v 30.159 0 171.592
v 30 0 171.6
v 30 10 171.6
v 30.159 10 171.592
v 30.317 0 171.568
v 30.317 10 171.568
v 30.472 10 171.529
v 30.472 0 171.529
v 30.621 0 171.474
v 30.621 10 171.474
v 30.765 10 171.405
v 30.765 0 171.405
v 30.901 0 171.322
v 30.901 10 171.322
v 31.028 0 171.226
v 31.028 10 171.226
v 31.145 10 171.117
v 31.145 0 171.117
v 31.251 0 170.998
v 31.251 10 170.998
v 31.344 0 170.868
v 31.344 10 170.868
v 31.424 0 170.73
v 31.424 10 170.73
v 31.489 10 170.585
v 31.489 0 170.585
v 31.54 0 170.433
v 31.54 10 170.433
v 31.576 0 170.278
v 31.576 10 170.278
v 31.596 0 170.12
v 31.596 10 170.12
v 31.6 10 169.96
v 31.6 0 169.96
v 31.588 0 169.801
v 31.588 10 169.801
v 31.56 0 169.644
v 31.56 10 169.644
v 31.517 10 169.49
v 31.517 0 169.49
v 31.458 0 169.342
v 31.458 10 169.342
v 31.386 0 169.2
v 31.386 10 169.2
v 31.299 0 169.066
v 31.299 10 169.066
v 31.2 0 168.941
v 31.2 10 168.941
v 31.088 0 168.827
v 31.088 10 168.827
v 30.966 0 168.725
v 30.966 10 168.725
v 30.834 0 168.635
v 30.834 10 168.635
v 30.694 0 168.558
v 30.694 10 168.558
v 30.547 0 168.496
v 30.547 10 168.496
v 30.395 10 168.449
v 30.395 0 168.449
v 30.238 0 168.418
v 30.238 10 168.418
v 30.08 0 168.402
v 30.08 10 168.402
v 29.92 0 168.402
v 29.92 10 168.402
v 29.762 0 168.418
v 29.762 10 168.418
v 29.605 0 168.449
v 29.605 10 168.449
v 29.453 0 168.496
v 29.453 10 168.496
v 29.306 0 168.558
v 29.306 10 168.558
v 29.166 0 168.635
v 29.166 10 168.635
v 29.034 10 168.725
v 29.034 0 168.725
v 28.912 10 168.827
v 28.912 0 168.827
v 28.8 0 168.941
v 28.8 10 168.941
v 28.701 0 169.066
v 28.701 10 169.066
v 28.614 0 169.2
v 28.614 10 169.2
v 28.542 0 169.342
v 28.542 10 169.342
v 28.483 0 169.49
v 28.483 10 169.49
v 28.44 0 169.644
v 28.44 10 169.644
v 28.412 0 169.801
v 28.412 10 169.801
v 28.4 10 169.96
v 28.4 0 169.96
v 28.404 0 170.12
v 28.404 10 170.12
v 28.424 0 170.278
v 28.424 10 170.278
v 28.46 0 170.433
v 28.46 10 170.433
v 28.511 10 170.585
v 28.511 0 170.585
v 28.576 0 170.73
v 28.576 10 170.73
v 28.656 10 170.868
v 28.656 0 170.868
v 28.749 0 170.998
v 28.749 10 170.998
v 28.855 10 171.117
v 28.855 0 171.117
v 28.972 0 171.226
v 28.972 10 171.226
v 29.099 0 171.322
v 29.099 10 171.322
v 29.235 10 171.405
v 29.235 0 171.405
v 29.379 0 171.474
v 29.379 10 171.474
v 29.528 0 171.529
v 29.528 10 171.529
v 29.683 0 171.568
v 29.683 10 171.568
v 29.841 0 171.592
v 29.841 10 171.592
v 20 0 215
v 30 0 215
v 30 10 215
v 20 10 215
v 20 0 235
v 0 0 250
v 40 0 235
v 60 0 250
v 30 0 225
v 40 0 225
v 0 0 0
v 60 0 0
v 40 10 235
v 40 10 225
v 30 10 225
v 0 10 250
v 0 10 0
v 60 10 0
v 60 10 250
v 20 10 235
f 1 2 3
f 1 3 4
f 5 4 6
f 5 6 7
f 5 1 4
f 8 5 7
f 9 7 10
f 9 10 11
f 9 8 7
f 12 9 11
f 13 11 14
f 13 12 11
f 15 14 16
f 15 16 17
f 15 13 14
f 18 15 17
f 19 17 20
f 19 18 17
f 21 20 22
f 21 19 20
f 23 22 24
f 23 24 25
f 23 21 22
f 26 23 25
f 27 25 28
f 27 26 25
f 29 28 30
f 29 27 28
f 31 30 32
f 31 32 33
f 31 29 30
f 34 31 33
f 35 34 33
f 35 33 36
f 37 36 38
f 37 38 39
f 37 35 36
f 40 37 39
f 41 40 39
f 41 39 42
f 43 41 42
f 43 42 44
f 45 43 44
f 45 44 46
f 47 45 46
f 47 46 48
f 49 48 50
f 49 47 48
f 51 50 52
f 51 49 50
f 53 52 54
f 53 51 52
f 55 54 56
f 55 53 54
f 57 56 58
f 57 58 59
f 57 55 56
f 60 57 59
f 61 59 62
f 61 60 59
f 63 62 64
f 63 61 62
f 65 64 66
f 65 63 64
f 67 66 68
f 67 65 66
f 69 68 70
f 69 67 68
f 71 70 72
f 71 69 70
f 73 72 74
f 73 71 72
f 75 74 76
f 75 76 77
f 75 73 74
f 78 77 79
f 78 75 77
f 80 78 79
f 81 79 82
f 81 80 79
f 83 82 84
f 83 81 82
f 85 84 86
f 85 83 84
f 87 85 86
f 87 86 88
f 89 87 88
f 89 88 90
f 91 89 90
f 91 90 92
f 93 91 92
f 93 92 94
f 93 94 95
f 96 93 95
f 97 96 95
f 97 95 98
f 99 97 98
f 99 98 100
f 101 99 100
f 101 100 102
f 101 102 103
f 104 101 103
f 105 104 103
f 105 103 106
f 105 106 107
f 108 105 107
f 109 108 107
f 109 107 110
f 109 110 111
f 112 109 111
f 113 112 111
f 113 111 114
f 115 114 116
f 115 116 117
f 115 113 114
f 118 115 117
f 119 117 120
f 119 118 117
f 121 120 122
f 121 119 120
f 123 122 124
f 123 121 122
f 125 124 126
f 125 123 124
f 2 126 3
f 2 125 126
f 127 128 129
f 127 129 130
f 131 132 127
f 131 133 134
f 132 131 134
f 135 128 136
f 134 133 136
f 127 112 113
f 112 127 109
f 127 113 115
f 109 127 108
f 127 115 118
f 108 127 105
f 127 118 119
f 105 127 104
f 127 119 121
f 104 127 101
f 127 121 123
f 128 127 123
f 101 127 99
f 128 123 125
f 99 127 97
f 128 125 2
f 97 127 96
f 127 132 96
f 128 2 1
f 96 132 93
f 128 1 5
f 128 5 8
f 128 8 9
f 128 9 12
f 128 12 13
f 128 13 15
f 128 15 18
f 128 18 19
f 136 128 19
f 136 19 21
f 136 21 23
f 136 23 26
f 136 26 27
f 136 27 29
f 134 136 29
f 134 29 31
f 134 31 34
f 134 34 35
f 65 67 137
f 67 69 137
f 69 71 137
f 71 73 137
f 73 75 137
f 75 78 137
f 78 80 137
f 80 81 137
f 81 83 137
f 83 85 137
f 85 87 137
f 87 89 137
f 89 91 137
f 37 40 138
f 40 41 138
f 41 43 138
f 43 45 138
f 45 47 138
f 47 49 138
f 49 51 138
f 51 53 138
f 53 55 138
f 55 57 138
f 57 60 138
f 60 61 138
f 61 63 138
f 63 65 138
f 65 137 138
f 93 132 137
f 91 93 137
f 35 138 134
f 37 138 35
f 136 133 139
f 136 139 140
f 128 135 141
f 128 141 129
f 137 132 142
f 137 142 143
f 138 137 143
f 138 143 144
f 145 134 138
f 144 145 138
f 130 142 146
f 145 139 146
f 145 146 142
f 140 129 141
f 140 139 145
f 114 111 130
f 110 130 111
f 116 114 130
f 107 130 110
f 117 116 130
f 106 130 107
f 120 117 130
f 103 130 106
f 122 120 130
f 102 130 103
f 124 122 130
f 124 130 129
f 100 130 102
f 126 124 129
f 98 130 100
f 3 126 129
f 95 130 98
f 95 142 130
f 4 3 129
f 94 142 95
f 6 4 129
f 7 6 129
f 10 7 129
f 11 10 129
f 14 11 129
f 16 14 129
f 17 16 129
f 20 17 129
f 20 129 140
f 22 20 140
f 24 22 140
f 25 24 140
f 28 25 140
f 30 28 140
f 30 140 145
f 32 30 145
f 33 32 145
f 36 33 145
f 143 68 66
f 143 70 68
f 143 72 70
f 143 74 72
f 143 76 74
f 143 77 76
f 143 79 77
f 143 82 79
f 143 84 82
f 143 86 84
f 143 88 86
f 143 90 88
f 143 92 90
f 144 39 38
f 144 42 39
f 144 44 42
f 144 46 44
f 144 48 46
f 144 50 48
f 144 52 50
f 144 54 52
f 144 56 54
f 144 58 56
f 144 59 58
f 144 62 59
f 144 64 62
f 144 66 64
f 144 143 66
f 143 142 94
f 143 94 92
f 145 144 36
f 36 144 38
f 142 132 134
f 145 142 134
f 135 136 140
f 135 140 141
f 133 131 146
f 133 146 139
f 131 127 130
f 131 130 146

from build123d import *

# Parameters (mm, degrees)
SKETCH1_W           = 60
SKETCH1_H           = 250
SKETCH1_R           = 1.6
BOSS_EXTRUDE1_DEPTH = 10


with BuildPart() as part:
    # Sketch1 → Boss-Extrude1 (new body)
    with BuildSketch(Plane(origin=(0, 0, 0), x_dir=(1, 0, 0), z_dir=(0, 1, 0))):
        with Locations((30, -125)):
            Rectangle(SKETCH1_W, SKETCH1_H)
        with Locations(Location((30, -170, 0), (0, 0, 270))):
            Circle(SKETCH1_R, mode=Mode.SUBTRACT)
        Polygon((20, -215), (20, -235), (40, -235), (40, -225), (30, -225), (30, -215), align=None, mode=Mode.SUBTRACT)
    extrude(amount=BOSS_EXTRUDE1_DEPTH)


solid = part.part
